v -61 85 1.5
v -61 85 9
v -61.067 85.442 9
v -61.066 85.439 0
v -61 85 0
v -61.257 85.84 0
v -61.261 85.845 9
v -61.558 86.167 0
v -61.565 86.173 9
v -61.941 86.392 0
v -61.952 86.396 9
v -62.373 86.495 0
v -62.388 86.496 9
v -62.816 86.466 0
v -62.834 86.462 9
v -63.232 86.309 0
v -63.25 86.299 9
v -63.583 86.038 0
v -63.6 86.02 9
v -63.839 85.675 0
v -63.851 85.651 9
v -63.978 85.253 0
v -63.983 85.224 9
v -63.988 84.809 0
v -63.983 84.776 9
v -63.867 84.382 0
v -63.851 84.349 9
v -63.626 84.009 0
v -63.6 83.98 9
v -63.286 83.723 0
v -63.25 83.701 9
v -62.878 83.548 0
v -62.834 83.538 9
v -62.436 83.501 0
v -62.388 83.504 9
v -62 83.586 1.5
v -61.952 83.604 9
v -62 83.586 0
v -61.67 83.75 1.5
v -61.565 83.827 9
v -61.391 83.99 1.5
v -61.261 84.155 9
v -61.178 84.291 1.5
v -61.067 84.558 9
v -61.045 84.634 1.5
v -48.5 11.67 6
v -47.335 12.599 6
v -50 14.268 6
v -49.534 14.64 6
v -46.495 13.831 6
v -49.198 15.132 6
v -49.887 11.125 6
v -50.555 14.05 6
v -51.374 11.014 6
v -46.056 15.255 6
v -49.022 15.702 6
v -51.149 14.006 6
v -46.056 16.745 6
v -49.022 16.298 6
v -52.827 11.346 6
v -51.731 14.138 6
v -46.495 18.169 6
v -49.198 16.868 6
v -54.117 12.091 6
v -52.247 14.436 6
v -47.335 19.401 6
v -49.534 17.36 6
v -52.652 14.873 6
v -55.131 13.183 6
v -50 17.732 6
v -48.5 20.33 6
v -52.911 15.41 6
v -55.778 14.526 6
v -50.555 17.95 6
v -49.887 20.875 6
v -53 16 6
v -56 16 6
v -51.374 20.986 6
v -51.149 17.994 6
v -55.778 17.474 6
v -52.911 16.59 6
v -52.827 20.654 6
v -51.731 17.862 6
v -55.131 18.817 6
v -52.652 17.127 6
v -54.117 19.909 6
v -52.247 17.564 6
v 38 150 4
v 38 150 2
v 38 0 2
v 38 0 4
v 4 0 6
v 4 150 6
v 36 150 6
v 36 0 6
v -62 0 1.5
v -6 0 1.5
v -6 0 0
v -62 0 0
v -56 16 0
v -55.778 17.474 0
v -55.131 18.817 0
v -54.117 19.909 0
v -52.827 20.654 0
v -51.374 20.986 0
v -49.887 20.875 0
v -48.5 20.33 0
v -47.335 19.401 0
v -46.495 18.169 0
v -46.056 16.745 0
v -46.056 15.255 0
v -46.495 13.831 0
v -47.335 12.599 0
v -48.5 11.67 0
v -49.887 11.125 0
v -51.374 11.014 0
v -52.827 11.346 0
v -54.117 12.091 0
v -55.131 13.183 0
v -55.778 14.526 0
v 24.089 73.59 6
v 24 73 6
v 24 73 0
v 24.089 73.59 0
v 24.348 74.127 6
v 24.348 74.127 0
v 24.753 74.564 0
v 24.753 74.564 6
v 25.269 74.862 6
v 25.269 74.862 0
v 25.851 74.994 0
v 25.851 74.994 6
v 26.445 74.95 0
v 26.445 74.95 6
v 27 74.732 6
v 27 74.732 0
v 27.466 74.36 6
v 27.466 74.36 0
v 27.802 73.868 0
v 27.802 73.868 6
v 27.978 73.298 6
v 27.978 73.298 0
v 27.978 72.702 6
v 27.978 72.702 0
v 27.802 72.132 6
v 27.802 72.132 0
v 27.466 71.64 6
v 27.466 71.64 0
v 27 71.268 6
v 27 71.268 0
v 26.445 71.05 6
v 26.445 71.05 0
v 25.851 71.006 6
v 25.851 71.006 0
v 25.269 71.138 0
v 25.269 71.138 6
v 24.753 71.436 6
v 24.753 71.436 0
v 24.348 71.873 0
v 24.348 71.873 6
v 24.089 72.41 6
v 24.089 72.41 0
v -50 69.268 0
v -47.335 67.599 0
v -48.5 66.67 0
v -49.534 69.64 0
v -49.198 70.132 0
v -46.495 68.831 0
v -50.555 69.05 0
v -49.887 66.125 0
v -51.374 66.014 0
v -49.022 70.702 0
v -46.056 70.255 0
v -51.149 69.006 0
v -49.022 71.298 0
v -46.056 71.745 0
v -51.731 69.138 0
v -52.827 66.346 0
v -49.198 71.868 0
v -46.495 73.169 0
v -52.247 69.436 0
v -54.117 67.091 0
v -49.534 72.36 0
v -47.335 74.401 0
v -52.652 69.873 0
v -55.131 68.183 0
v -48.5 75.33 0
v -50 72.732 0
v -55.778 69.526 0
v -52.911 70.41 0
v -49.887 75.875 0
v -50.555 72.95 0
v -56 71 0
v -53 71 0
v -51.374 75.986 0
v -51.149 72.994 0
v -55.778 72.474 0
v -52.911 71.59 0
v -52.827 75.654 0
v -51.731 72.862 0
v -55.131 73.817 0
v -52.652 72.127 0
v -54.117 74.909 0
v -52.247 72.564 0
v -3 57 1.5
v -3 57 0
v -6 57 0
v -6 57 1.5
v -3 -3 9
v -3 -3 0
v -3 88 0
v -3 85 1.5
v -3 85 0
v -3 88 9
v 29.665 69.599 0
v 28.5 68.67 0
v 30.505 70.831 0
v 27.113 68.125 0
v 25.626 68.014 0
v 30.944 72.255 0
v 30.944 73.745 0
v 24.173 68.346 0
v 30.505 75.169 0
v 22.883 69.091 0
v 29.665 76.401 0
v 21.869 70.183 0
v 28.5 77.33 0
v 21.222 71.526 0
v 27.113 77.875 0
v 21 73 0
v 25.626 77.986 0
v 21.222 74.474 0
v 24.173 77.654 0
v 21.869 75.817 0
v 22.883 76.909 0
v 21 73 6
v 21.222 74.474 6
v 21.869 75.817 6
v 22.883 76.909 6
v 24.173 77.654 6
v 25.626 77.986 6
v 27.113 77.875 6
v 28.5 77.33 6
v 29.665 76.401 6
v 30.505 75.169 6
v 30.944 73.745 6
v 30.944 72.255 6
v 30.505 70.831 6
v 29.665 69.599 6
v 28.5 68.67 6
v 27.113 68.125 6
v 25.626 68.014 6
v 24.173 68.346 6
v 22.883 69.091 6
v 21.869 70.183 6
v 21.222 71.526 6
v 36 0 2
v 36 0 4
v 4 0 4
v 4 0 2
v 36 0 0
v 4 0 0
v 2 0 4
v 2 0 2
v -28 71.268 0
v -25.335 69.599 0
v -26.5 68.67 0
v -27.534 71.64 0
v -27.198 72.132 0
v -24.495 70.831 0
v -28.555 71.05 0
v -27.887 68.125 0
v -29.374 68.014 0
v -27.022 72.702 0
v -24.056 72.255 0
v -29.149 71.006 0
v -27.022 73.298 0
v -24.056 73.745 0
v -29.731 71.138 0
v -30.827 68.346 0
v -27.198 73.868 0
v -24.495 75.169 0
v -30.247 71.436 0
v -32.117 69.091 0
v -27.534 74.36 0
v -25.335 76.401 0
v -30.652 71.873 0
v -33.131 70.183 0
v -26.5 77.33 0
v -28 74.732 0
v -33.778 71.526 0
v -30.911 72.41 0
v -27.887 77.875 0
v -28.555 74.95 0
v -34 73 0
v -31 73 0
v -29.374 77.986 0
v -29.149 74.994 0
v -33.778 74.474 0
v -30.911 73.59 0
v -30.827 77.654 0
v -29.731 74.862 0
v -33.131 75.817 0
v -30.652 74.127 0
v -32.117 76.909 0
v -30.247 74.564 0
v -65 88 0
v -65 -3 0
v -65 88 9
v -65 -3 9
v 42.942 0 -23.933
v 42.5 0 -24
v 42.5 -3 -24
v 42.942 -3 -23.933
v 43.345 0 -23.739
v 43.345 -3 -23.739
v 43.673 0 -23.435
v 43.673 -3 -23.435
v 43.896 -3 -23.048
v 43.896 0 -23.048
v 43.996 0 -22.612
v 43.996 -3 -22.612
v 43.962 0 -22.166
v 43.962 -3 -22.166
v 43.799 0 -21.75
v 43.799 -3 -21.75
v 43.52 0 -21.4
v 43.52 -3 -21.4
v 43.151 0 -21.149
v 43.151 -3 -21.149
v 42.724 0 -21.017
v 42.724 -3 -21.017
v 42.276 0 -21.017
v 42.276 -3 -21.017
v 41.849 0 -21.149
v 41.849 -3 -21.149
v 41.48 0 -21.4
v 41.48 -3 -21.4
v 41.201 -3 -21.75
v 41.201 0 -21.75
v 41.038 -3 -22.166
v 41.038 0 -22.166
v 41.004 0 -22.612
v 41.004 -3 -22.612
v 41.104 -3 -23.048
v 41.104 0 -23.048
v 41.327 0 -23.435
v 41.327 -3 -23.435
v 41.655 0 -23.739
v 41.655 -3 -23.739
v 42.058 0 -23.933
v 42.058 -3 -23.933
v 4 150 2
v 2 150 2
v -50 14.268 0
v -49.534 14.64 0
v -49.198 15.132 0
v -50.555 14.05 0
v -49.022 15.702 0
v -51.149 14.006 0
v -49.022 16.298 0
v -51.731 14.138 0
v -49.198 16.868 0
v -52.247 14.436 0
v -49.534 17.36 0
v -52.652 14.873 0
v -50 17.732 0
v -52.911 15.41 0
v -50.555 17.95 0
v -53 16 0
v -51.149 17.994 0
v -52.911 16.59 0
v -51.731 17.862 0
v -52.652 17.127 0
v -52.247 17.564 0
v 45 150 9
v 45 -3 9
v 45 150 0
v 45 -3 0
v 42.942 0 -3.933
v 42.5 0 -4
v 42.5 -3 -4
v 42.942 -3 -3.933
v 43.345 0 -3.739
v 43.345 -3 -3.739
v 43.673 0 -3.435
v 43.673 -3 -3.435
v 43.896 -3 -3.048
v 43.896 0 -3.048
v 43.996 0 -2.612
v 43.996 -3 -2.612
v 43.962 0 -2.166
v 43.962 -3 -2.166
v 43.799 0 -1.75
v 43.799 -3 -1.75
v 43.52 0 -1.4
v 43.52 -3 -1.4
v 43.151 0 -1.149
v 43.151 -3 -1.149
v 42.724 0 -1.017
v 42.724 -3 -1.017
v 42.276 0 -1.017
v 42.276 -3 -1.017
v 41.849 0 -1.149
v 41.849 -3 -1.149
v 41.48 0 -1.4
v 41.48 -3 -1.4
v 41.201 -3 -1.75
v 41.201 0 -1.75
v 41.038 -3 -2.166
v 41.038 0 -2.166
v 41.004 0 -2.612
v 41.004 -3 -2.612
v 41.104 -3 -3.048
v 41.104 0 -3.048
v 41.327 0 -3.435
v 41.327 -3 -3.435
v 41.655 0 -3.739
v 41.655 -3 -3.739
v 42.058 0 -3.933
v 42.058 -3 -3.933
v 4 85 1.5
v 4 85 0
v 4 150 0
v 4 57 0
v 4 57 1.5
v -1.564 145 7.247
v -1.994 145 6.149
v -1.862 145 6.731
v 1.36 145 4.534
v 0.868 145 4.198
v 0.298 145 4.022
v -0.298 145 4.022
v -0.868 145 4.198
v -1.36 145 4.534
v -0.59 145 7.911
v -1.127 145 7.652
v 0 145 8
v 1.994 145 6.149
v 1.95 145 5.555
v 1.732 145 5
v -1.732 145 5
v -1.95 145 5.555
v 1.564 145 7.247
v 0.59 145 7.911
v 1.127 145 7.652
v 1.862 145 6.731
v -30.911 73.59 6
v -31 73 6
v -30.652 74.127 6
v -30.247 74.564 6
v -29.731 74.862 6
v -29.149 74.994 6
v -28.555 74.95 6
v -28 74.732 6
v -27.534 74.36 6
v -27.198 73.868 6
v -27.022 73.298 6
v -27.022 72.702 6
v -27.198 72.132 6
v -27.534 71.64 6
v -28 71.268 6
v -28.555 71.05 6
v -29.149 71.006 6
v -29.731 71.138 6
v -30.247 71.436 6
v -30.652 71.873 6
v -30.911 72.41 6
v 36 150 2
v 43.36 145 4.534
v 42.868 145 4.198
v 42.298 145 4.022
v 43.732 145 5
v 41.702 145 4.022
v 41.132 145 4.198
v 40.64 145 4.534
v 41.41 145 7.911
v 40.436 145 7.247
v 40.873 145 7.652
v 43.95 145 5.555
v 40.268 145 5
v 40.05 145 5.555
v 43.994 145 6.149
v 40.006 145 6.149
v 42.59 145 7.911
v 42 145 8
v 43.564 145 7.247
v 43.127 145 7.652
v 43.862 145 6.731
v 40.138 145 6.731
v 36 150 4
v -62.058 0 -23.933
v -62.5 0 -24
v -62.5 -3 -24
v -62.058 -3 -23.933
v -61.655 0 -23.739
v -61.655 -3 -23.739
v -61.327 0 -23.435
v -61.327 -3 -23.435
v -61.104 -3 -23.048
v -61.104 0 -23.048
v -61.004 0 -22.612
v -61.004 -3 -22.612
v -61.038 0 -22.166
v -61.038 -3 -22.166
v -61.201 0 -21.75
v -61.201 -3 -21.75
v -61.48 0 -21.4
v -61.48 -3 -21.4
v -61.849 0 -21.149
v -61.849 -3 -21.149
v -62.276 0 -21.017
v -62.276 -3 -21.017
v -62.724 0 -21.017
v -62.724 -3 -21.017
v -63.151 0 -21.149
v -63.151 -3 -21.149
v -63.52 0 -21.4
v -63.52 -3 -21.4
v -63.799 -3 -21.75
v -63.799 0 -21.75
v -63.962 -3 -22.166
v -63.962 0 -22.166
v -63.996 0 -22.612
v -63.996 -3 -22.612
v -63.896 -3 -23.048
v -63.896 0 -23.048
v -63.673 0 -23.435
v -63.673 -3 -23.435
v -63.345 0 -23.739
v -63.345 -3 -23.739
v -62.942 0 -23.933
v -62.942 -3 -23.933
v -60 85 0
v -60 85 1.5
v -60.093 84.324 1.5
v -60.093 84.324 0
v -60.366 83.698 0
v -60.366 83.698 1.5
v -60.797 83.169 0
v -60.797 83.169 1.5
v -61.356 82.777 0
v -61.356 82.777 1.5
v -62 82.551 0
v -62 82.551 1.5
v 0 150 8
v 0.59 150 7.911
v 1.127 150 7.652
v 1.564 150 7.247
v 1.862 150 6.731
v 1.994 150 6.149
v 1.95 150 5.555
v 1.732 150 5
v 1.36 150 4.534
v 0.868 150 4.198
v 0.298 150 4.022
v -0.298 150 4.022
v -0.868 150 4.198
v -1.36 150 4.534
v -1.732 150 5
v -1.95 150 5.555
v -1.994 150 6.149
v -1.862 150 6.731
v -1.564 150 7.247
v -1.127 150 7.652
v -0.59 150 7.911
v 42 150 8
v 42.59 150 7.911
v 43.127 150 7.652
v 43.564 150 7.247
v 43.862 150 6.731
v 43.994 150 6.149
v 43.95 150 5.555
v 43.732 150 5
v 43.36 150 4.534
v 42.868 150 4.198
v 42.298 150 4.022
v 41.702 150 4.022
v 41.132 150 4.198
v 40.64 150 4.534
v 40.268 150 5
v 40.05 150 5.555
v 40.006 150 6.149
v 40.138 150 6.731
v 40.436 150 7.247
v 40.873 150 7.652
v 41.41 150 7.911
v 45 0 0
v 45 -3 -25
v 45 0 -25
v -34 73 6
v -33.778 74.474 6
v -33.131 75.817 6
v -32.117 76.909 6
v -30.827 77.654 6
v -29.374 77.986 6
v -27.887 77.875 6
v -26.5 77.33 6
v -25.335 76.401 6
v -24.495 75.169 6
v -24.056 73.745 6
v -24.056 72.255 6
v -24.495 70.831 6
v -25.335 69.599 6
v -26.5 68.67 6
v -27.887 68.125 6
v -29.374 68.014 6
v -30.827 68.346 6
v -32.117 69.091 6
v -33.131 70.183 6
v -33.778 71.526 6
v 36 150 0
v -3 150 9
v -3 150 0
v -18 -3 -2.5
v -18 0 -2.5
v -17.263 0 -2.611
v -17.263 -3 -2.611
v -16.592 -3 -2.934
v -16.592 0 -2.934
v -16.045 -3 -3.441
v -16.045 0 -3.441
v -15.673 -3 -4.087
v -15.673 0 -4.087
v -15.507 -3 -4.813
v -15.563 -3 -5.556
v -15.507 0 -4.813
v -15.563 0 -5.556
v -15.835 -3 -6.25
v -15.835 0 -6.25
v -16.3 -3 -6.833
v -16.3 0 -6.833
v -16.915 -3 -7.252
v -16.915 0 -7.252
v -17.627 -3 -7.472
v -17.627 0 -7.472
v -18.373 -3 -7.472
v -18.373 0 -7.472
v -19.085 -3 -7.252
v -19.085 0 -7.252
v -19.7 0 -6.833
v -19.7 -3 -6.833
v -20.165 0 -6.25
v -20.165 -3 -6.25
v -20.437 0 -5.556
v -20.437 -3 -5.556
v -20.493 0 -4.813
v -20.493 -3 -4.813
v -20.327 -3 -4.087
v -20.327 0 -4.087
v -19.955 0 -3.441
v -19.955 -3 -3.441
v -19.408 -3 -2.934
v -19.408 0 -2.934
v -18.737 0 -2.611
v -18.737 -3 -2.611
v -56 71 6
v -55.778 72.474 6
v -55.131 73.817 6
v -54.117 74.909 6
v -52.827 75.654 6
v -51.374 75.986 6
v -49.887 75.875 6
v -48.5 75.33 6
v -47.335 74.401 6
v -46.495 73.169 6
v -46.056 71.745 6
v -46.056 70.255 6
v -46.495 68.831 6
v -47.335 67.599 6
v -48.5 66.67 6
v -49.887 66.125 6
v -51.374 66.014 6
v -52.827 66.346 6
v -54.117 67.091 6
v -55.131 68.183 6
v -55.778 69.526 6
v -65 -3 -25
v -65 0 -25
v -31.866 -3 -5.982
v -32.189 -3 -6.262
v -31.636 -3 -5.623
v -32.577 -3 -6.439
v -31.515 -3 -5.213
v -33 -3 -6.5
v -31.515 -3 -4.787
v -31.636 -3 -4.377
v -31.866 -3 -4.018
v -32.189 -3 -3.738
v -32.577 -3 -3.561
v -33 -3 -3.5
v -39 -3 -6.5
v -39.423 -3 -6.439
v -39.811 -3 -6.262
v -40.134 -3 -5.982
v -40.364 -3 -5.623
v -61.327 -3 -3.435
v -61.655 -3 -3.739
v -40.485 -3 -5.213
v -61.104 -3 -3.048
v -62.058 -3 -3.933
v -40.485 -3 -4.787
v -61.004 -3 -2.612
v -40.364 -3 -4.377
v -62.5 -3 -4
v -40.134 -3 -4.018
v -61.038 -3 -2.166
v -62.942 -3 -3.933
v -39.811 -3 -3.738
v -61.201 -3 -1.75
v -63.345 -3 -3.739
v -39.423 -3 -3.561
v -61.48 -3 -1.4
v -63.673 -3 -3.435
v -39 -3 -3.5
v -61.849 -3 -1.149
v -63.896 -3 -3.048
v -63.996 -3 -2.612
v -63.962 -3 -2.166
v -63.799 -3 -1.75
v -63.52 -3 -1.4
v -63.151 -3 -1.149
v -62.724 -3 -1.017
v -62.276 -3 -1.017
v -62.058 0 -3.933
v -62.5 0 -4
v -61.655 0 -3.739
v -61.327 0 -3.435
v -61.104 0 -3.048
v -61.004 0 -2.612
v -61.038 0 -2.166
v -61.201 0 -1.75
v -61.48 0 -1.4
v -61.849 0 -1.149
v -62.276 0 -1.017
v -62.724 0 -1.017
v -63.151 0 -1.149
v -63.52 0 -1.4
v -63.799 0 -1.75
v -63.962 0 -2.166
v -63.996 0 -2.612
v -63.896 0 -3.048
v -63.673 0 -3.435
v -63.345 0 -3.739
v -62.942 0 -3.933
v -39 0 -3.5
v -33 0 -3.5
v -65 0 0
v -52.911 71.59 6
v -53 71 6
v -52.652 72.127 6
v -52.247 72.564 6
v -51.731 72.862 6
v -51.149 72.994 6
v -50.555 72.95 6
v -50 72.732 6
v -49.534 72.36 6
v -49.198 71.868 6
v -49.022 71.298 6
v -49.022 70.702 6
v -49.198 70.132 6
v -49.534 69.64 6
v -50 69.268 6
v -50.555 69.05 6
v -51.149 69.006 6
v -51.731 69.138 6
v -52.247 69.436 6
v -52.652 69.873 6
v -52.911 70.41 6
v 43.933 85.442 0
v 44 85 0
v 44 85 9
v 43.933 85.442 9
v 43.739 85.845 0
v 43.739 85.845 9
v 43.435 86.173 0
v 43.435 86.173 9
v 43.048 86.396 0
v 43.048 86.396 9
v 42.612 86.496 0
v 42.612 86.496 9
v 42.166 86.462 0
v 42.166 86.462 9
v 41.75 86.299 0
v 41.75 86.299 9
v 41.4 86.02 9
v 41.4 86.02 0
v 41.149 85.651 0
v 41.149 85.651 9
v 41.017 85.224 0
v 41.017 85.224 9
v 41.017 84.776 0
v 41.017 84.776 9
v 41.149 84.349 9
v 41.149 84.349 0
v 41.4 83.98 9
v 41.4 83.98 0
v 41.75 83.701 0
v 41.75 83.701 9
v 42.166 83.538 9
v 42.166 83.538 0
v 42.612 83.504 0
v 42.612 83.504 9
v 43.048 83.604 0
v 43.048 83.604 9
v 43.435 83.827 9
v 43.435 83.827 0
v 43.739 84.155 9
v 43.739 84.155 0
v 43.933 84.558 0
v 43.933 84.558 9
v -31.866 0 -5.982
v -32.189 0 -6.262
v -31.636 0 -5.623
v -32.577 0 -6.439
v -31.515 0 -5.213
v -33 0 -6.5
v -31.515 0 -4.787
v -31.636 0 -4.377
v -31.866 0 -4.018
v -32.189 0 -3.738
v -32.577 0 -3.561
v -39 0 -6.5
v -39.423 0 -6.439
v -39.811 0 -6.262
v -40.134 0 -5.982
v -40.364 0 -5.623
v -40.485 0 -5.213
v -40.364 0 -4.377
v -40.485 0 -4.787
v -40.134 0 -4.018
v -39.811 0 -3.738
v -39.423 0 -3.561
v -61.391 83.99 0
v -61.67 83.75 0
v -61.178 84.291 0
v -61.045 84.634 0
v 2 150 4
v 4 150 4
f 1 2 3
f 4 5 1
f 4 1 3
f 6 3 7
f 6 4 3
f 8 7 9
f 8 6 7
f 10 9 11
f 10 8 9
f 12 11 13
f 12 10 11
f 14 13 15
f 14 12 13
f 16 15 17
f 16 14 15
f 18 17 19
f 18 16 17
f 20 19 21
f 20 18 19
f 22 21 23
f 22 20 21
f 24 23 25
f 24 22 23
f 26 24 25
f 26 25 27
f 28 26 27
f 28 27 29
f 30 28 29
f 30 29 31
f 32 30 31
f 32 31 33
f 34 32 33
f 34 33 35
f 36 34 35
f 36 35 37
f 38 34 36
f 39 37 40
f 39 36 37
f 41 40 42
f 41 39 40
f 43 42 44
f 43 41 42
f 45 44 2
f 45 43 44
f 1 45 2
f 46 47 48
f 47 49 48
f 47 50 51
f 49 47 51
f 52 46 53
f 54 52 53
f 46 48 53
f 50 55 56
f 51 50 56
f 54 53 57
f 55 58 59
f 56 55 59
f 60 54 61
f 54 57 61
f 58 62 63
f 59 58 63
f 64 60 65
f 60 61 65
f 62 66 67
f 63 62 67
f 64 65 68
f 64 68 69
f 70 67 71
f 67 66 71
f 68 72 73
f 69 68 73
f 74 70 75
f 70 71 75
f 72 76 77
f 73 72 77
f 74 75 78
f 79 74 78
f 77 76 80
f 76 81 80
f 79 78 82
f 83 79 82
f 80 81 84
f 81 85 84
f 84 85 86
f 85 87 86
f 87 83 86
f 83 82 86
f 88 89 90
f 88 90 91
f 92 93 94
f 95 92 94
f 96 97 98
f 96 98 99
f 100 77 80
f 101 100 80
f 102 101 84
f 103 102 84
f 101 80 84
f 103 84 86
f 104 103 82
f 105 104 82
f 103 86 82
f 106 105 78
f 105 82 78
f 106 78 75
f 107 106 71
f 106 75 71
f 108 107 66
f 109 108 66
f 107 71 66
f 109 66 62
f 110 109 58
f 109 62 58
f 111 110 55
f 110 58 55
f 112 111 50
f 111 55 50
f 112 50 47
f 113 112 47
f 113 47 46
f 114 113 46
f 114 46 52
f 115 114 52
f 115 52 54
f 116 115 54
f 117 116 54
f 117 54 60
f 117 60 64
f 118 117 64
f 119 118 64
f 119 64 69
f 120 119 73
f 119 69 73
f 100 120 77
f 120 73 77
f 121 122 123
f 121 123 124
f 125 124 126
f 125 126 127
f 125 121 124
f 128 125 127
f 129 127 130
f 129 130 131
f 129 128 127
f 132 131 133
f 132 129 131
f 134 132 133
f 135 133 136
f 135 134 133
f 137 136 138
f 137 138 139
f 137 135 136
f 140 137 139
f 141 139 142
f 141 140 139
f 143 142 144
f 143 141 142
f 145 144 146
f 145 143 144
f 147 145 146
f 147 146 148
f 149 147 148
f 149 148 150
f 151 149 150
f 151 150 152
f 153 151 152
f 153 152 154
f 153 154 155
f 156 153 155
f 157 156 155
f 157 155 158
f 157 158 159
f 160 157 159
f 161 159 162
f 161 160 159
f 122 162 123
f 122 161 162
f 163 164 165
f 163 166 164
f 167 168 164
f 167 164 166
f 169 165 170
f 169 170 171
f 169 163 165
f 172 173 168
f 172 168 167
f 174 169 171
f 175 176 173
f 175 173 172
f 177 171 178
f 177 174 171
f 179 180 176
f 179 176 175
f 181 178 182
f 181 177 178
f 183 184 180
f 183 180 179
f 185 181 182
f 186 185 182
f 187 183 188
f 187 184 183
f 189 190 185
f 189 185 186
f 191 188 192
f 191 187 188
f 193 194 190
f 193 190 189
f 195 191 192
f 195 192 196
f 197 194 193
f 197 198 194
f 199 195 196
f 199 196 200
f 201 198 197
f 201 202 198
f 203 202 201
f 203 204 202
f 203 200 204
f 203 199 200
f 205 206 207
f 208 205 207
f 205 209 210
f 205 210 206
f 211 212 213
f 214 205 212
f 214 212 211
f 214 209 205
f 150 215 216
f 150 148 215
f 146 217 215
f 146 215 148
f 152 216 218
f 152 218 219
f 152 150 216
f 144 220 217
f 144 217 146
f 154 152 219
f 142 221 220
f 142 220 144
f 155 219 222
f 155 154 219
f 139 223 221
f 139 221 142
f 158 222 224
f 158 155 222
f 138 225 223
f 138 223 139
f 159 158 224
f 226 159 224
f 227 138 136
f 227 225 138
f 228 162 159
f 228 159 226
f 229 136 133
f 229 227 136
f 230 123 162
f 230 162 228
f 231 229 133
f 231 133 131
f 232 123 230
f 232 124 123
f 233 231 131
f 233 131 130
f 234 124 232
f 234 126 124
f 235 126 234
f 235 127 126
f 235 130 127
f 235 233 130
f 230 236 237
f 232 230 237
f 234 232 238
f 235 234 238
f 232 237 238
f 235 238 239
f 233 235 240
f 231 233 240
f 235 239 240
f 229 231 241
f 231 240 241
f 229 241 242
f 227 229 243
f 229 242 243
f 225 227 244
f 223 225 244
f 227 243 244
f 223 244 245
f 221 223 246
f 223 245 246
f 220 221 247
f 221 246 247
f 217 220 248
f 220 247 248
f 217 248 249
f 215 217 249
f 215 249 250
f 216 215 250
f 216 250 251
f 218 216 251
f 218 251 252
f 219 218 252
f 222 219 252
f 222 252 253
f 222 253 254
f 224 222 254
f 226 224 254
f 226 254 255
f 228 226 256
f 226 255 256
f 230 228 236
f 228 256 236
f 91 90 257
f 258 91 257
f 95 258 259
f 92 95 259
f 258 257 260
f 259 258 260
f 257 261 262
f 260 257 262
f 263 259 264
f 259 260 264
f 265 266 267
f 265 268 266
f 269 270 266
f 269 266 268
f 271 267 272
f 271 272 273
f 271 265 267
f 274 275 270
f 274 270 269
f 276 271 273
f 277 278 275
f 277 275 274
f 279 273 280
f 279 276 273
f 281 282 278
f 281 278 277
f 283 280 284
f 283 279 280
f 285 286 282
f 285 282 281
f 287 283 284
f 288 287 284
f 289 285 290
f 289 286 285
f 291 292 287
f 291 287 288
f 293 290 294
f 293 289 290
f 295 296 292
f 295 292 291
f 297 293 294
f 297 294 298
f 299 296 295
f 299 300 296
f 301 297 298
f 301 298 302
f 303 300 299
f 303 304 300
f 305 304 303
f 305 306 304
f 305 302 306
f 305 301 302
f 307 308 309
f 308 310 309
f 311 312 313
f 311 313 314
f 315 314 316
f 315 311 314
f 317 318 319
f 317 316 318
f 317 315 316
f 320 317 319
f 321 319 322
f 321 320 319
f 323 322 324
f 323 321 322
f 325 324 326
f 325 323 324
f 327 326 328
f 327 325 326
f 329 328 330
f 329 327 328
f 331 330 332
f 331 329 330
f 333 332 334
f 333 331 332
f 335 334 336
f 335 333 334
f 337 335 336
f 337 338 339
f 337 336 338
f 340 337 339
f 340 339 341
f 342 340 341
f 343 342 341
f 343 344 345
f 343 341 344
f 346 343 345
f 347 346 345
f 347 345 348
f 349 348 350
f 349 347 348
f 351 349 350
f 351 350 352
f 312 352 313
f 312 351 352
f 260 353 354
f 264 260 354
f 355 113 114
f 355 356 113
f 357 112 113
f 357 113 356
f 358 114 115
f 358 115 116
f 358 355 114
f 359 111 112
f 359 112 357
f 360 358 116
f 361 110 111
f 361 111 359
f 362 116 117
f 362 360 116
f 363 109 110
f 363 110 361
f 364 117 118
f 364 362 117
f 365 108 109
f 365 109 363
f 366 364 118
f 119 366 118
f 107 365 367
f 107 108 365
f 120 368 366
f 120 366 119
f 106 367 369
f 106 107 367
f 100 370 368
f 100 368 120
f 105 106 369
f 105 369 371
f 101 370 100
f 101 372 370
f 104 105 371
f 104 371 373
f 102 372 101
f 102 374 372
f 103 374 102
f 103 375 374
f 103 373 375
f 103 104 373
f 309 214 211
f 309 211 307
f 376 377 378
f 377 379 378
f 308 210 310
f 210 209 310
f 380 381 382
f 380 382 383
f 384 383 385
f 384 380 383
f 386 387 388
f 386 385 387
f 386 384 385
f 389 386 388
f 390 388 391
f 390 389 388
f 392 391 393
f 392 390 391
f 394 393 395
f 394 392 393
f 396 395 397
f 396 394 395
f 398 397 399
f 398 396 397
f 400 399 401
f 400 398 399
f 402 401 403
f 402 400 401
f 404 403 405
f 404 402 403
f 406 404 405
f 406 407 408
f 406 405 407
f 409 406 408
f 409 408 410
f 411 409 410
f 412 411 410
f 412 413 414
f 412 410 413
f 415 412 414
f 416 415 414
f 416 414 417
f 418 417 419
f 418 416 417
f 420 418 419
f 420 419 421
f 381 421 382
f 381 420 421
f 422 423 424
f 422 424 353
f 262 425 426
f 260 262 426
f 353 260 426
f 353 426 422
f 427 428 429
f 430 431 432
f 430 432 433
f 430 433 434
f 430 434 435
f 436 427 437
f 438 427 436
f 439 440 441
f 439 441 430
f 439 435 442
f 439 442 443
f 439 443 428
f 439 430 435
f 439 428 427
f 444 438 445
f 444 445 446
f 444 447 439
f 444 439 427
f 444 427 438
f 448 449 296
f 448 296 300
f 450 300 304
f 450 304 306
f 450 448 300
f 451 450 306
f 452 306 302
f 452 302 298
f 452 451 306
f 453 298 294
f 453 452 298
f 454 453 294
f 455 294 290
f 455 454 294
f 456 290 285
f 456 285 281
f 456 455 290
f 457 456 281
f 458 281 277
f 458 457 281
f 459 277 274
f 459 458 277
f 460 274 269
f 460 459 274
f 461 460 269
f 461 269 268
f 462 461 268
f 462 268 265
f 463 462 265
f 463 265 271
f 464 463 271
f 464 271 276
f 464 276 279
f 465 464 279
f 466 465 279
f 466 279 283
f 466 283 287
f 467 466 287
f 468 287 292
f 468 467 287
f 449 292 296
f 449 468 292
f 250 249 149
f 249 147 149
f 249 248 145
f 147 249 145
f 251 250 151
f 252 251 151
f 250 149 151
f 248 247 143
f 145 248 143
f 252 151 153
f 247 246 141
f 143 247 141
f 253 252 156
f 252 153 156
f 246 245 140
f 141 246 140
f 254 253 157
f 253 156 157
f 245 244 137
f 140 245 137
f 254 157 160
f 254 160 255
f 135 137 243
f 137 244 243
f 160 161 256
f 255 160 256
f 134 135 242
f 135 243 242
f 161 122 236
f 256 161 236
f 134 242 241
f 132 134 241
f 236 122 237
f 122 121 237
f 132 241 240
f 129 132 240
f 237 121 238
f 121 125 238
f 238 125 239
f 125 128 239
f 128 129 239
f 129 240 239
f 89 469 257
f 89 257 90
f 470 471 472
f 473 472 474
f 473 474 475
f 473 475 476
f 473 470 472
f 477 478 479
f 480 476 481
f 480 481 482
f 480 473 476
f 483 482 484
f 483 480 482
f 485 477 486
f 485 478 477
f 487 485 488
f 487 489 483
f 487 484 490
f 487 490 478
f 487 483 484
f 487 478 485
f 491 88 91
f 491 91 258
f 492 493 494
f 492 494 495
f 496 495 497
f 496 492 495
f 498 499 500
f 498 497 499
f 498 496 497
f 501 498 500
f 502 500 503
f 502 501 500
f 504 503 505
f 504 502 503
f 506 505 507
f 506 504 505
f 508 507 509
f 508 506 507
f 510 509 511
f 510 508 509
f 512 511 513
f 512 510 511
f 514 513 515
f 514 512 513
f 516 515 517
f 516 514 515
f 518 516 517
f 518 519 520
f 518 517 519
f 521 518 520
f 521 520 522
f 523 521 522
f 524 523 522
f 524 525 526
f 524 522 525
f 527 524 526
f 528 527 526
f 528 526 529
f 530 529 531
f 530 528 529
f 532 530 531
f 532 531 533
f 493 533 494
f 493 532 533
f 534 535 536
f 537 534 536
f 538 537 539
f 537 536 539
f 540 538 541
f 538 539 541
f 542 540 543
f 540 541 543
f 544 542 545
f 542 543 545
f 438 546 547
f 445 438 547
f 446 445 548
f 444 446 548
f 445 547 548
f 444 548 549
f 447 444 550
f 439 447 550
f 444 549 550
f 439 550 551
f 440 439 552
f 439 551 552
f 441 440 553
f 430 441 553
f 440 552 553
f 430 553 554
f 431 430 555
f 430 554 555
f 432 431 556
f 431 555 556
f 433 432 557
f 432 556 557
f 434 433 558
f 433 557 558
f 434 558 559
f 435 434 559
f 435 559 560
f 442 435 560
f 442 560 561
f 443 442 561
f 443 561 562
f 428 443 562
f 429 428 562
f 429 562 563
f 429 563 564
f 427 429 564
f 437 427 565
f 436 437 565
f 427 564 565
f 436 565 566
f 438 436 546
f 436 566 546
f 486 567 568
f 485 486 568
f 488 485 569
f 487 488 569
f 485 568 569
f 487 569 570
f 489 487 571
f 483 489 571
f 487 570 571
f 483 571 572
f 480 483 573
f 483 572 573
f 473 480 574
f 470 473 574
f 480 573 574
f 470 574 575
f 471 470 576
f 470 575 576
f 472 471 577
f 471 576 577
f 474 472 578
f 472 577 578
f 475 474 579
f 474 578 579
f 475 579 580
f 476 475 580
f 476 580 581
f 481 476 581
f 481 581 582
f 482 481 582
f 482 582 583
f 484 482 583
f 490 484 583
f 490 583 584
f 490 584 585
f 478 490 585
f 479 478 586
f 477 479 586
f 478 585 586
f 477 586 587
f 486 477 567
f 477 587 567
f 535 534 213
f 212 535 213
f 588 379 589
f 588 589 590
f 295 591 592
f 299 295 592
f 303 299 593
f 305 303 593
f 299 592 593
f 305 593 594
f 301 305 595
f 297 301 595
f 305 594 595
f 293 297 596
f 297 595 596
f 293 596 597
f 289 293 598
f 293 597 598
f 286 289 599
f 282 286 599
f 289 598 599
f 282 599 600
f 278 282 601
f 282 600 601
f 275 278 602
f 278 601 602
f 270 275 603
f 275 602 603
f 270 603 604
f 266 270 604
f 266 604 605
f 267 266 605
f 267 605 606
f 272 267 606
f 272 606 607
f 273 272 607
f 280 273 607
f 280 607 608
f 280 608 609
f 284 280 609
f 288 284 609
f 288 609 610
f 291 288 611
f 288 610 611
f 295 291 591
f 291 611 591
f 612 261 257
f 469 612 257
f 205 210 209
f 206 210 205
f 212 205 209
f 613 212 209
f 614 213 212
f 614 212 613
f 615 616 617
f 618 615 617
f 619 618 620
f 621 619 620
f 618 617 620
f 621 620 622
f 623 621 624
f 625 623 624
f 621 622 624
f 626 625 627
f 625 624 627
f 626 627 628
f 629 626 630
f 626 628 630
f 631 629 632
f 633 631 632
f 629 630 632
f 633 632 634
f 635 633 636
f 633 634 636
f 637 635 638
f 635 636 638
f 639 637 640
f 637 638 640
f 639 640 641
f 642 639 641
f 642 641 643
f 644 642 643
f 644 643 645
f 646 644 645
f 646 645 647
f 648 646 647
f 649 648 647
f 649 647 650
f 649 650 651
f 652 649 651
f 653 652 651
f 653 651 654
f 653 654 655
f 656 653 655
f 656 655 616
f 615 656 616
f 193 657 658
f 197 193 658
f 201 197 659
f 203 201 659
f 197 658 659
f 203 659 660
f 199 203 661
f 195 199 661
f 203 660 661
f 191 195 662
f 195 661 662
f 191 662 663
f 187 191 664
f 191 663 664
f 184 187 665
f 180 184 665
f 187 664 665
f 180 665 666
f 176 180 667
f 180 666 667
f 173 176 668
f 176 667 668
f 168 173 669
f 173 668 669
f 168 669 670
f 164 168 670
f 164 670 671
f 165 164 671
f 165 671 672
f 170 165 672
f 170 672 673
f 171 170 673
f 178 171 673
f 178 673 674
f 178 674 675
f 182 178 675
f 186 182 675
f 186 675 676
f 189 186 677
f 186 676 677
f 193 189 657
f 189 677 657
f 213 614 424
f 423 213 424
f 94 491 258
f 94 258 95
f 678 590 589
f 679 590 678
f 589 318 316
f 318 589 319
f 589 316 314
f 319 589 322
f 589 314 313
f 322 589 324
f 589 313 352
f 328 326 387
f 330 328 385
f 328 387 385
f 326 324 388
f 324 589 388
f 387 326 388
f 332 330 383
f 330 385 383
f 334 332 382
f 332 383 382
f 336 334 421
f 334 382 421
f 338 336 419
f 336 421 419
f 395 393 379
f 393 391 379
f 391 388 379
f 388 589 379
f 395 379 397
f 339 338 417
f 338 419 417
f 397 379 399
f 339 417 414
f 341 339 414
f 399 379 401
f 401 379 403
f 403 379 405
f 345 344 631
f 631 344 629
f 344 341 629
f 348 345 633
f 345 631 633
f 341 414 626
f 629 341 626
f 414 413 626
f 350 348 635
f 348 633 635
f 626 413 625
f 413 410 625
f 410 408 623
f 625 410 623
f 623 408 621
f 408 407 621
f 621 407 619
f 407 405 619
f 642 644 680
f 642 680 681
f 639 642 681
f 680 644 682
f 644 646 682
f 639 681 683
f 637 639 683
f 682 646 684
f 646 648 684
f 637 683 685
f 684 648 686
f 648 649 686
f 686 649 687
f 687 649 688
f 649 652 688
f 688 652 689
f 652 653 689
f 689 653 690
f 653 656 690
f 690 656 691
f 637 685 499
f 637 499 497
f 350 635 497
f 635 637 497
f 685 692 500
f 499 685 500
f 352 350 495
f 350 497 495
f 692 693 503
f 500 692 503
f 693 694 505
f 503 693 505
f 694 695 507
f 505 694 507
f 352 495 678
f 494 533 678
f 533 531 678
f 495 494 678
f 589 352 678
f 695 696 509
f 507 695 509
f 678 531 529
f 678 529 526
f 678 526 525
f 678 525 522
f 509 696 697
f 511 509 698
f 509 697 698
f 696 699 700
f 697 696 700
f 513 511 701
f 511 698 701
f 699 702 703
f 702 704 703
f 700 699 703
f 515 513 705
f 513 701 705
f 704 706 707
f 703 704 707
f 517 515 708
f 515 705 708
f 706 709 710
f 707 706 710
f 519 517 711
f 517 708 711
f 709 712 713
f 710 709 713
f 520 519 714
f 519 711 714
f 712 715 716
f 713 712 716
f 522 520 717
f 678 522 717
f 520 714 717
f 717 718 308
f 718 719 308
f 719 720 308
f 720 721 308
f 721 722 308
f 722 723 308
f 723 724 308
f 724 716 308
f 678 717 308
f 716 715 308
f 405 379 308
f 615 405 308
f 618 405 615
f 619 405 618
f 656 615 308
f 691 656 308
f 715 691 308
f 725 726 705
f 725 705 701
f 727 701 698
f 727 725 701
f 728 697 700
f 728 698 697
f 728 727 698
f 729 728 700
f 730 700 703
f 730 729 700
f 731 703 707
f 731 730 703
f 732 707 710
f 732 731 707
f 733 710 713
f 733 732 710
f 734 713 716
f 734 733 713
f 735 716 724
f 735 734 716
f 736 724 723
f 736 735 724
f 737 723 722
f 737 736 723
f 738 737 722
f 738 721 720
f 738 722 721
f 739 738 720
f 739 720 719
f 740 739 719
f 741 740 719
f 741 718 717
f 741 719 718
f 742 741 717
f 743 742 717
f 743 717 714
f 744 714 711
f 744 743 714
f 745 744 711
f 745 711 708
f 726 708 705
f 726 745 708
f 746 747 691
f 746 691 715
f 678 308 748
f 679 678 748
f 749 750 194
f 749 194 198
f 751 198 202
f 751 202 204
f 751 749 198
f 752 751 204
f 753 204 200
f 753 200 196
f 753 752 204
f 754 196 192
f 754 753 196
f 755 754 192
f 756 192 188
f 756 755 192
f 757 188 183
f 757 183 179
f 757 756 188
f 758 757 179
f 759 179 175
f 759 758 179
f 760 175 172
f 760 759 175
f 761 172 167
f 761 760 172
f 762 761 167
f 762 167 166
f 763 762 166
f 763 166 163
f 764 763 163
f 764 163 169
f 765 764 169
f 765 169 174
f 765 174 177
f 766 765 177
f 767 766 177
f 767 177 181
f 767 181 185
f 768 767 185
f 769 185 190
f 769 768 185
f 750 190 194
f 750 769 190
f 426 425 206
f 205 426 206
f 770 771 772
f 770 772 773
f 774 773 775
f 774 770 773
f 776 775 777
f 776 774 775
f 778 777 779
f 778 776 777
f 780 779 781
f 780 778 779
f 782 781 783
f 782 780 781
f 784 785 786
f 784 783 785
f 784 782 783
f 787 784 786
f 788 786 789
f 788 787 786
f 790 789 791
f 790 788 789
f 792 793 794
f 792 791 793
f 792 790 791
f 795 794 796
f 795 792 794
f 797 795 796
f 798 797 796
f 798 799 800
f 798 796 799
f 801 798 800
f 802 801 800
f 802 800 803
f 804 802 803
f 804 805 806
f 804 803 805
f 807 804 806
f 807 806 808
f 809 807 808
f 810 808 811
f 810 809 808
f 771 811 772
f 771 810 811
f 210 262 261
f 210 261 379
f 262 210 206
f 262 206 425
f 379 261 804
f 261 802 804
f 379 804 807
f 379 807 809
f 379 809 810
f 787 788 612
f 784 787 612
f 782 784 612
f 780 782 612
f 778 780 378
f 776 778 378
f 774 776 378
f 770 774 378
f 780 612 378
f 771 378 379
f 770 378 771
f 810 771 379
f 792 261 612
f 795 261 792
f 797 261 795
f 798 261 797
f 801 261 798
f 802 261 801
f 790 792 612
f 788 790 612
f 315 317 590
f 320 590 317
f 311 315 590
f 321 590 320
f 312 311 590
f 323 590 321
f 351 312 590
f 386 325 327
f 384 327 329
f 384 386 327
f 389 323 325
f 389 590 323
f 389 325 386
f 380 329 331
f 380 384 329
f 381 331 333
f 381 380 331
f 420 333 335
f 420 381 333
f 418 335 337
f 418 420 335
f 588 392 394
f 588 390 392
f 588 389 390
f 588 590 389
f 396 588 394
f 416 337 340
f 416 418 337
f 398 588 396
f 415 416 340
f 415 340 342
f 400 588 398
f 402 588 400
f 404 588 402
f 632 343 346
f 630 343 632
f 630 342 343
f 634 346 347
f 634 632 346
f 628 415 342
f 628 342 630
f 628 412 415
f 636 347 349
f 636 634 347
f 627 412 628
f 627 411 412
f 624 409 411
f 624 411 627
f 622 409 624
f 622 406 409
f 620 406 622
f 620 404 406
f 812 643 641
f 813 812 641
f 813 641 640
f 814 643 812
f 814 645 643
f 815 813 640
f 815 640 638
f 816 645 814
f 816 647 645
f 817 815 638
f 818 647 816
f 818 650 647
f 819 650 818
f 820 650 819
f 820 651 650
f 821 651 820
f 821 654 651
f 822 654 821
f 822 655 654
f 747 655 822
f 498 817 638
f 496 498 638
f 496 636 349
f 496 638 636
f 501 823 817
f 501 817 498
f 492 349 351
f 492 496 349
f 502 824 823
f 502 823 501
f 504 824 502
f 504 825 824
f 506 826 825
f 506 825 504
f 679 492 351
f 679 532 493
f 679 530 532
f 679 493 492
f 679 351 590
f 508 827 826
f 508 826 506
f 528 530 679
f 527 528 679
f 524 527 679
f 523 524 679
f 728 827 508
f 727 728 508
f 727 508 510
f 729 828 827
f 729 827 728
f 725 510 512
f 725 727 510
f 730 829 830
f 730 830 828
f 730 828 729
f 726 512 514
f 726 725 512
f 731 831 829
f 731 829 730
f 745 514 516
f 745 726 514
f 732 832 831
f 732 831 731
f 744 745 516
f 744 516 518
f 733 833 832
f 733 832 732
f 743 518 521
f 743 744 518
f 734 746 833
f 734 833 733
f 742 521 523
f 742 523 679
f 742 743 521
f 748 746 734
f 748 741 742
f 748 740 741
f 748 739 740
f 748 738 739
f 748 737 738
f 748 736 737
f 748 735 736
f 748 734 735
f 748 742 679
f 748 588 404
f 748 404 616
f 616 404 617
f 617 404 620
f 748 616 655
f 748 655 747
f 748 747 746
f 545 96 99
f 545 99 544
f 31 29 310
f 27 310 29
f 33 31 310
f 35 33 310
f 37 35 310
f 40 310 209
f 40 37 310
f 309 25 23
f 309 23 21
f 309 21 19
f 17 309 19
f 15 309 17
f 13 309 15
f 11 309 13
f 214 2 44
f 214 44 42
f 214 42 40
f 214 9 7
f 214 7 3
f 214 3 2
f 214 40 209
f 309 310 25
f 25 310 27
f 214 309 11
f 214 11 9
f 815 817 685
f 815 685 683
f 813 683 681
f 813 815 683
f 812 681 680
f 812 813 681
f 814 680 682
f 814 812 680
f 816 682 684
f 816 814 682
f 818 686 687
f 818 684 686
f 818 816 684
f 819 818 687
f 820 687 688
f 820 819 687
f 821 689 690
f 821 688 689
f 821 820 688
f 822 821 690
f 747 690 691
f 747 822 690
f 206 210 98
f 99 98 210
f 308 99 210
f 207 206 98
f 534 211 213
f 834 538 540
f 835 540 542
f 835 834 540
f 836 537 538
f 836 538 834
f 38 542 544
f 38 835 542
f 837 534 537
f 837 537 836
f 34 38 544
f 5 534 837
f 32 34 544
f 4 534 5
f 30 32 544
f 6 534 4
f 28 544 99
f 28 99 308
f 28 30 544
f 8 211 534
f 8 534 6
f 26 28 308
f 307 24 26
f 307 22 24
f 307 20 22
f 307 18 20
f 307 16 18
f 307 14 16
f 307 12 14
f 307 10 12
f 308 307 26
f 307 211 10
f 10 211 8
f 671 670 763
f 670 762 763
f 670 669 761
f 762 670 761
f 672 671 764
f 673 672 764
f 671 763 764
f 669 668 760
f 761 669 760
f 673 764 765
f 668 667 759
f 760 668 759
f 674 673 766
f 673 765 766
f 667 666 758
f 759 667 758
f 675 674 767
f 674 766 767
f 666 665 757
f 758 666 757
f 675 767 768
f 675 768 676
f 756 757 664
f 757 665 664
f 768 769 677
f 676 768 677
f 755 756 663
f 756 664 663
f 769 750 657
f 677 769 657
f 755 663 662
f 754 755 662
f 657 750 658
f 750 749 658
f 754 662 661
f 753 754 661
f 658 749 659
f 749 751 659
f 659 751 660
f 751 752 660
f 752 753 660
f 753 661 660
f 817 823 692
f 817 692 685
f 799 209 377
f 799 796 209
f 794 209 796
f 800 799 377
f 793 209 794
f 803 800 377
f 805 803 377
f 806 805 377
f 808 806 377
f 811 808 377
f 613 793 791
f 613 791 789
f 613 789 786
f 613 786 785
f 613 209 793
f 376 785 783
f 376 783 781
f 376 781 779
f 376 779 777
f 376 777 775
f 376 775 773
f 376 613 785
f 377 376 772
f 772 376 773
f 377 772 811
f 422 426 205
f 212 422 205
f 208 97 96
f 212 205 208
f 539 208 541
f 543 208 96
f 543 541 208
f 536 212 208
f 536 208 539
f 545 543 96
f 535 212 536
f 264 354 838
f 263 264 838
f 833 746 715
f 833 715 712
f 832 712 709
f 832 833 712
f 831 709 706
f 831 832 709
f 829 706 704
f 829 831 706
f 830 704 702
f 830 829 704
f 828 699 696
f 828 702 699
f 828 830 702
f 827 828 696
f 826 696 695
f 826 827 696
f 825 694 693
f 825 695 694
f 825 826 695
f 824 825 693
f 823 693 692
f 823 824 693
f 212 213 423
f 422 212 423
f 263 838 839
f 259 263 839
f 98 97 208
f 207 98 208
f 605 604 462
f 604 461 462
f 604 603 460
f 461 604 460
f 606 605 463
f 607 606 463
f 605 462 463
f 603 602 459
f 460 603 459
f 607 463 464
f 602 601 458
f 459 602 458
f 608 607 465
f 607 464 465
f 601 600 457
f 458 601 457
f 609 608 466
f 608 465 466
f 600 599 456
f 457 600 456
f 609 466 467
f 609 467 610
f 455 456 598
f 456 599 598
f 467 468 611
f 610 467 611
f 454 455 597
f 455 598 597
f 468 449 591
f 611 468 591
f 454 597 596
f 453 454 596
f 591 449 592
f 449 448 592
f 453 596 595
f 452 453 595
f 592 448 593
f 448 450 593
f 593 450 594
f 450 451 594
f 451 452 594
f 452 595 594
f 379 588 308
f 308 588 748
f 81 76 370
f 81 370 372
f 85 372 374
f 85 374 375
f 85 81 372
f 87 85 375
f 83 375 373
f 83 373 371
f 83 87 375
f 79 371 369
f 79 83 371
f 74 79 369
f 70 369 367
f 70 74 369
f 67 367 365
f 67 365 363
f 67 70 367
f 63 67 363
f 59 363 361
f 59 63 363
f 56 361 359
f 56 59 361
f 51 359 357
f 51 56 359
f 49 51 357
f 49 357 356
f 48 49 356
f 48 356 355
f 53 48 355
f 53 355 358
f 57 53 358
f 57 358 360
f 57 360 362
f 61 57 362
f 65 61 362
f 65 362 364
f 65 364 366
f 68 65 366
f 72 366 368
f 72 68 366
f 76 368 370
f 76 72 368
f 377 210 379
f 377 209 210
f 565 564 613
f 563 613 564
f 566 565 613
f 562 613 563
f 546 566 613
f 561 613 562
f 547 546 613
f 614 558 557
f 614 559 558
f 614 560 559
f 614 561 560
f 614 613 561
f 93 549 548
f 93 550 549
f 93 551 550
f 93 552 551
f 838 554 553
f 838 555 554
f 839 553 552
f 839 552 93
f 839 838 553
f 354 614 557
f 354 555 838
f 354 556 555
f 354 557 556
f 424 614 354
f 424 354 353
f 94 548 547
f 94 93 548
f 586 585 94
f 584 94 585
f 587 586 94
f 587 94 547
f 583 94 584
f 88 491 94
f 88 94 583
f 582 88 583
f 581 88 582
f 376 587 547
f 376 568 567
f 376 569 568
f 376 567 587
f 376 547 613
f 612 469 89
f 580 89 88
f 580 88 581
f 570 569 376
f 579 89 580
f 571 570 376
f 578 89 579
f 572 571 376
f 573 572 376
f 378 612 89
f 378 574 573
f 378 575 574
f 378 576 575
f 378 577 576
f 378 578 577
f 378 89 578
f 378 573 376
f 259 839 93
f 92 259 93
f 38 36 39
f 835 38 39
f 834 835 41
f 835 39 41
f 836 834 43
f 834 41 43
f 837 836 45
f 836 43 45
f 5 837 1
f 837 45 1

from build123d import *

# Parameters (mm, degrees)
P_IDAT_VYSUNUT_M1_DEPTH           = 6
SKICA2_W                          = 48
SKICA2_H                          = 153
P_IDAT_VYSUNUT_M2_DEPTH           = 3
SKICA5_W                          = 62
SKICA5_H                          = 91
P_IDAT_VYSUNUT_M4_DEPTH           = 7.5
SKICA7_W                          = 62
SKICA7_H                          = 91
SKICA7_W_2                        = 56
SKICA7_H_2                        = 85
P_IDAT_VYSUNUT_M5_DEPTH           = 1.5
P_IDAT_VYSUNUT_M6_DEPTH           = 153
SKICA9_W                          = 7
SKICA9_H                          = 28
SKICA9_W_2                        = 3
ODEBRAT_VYSUNUT_M2_DEPTH          = 1.5
SKICA10_W                         = 110
SKICA10_H                         = 3
P_IDAT_VYSUNUT_M7_DEPTH           = 25
SKICA11_R                         = 2.5
ODEBRAT_VYSUNUT_M3_DEPTH          = 166.378354085
VYSUNOUT_START                    = -4.5
VYSUNOUT_TENKOST_NN_1_OUTLINE_R   = 5
VYSUNOUT_TENKOST_NN_1_OUTLINE_R_2 = 2
VYSUNOUT_TENKOST_NN_1_DEPTH       = 6
SKICA13_R                         = 2
ODEBRAT_VYSUNUT_M4_DEPTH          = 5
ODEBRAT_VYSUNUT_M6_DEPTH          = 169.104134393
ODEBRAT_VYSUNUT_M6_DEPTH_BACK     = 169.104134393
SKICA14_R                         = 1.5
ODEBRAT_VYSUNUT_M7_DEPTH          = 167.976046186
ODEBRAT_VYSUNUT_M7_DEPTH_BACK     = 167.976046186
SKICA15_R                         = 1.5
P_IDAT_VYSUNUT_M8_DEPTH           = 1.5


# Read off the part's stored shape, not the designer's step: Vysunout tenkostěnný1
with BuildPart() as part:
    # Skica1 → Přidat vysunutím1 (new body)
    with BuildSketch(Plane.XY):
        Polygon((40, -3), (45, -3), (45, 150), (40, 150), (40, 0), (0, 0), (0, 150), (-3, 150), (-3, -3), (0, -3), align=None)
    extrude(amount=P_IDAT_VYSUNUT_M1_DEPTH)

    # Skica2 → Přidat vysunutím2 (add)
    with BuildSketch(Plane.XY.offset(6)):
        with Locations((21, 73.5)):
            Rectangle(SKICA2_W, SKICA2_H)
    extrude(amount=P_IDAT_VYSUNUT_M2_DEPTH)

    # Skica3 → Přidat vysunutím6 (add, through all)
    with BuildSketch(Plane.XZ.offset(3)):
        Polygon((0, 0), (4, 0), (4, 2), (2, 2), (2, 4), (4, 4), (4, 6), (0, 6), align=None)
        Polygon((40, 0), (36, 0), (36, 2), (38, 2), (38, 4), (36, 4), (36, 6), (40, 6), align=None)
    extrude(amount=-P_IDAT_VYSUNUT_M6_DEPTH)


with BuildPart() as body_2:
    # Skica5 → Přidat vysunutím4 (new body)
    with BuildSketch(Plane.XY.offset(9)):
        with Locations((-34, 42.5)):
            Rectangle(SKICA5_W, SKICA5_H)
    extrude(amount=-P_IDAT_VYSUNUT_M4_DEPTH)

    # Skica7 → Přidat vysunutím5 (add, through all)
    with BuildSketch(Plane(origin=(0, 0, 1.5), x_dir=(-1, 0, 0), z_dir=(0, 0, -1))):
        with Locations((34, 42.5)):
            Rectangle(SKICA7_W, SKICA7_H)
        with Locations((34, 42.5)):
            Rectangle(SKICA7_W_2, SKICA7_H_2, mode=Mode.SUBTRACT)
    extrude(amount=P_IDAT_VYSUNUT_M5_DEPTH)


with BuildPart() as odebrat_vysunut_m2_tool:
    # Skica9 → Odebrat vysunutím2 (new body)
    with BuildSketch(Plane(origin=(0, 0, 0), x_dir=(-1, 0, 0), z_dir=(0, 0, -1))):
        with Locations((-0.5, 71)):
            Rectangle(SKICA9_W, SKICA9_H)
        with Locations((4.5, 71)):
            Rectangle(SKICA9_W_2, SKICA9_H)
    extrude(amount=-ODEBRAT_VYSUNUT_M2_DEPTH)


with BuildPart() as part_1:
    add(part.part)

    # Odebrat vysunutím2: cut by odebrat_vysunut_m2_tool
    add(odebrat_vysunut_m2_tool.part, mode=Mode.SUBTRACT)

    # Skica13 → Odebrat vysunutím4 (cut)
    with BuildSketch(Plane(origin=(0, 150, 0), x_dir=(1, 0, 0), z_dir=(0, 1, 0))):
        with Locations(Location((42, -6, 0), (0, 0, 270))):
            Circle(SKICA13_R)
        with Locations(Location((0, -6, 0), (0, 0, 270))):
            Circle(SKICA13_R)
    extrude(amount=-ODEBRAT_VYSUNUT_M4_DEPTH, mode=Mode.SUBTRACT)


with BuildPart() as body_2_1:
    add(body_2.part)

    # Odebrat vysunutím2: cut by odebrat_vysunut_m2_tool
    add(odebrat_vysunut_m2_tool.part, mode=Mode.SUBTRACT)


with BuildPart() as body_3:
    # Skica10 → Přidat vysunutím7 (new body)
    with BuildSketch(Plane(origin=(0, 0, 0), x_dir=(-1, 0, 0), z_dir=(0, 0, -1))):
        with Locations((10, -1.5)):
            Rectangle(SKICA10_W, SKICA10_H)
    extrude(amount=P_IDAT_VYSUNUT_M7_DEPTH)

    # Skica11 → Odebrat vysunutím3 (cut, through all)
    with BuildSketch(Plane(origin=(0, 0, 0), x_dir=(1, 0, 0), z_dir=(0, 1, 0))):
        with Locations(Location((-18, 5, 0), (0, 0, 270))):
            Circle(SKICA11_R)
        with BuildLine():
            Line((-33, 3.5), (-39, 3.5))
            ThreePointArc((-39, 3.5), (-40.5, 5), (-39, 6.5))
            Line((-39, 6.5), (-33, 6.5))
            ThreePointArc((-33, 6.5), (-31.5, 5), (-33, 3.5))
        make_face()
    extrude(amount=-ODEBRAT_VYSUNUT_M3_DEPTH, mode=Mode.SUBTRACT)

    # Skica14 → Odebrat vysunutím6 (cut, two sides: drawn at the far end of the back side and taken through both)
    with BuildSketch(Plane.XZ.offset(3).offset(-ODEBRAT_VYSUNUT_M6_DEPTH_BACK)):
        with Locations(Location((-62.5, -2.5, 0), (0, 0, 270))):
            Circle(SKICA14_R)
        with Locations(Location((-62.5, -22.5, 0), (0, 0, 270))):
            Circle(SKICA14_R)
        with Locations(Location((42.5, -2.5, 0), (0, 0, 270))):
            Circle(SKICA14_R)
        with Locations(Location((42.5, -22.5, 0), (0, 0, 270))):
            Circle(SKICA14_R)
    extrude(amount=ODEBRAT_VYSUNUT_M6_DEPTH + ODEBRAT_VYSUNUT_M6_DEPTH_BACK, mode=Mode.SUBTRACT)


with BuildPart() as body_4:
    # Vysunout tenkostěnný1 outline → Vysunout tenkostěnný1 (new body)
    # profile 1 of 4: a face of its own
    with BuildSketch(Plane(origin=(0, 0, 1.5), x_dir=(-1, 0, 0), z_dir=(0, 0, -1)).offset(VYSUNOUT_START)):
        with Locations((51, 16)):
            Circle(VYSUNOUT_TENKOST_NN_1_OUTLINE_R)
        with Locations((51, 16)):
            Circle(VYSUNOUT_TENKOST_NN_1_OUTLINE_R_2, mode=Mode.SUBTRACT)
    # profile 2 of 4: a face of its own
    with BuildSketch(Plane(origin=(0, 0, 1.5), x_dir=(-1, 0, 0), z_dir=(0, 0, -1)).offset(VYSUNOUT_START)):
        with Locations((-26, 73)):
            Circle(VYSUNOUT_TENKOST_NN_1_OUTLINE_R)
        with Locations((-26, 73)):
            Circle(VYSUNOUT_TENKOST_NN_1_OUTLINE_R_2, mode=Mode.SUBTRACT)
    # profile 3 of 4: a face of its own
    with BuildSketch(Plane(origin=(0, 0, 1.5), x_dir=(-1, 0, 0), z_dir=(0, 0, -1)).offset(VYSUNOUT_START)):
        with Locations((29, 73)):
            Circle(VYSUNOUT_TENKOST_NN_1_OUTLINE_R)
        with Locations((29, 73)):
            Circle(VYSUNOUT_TENKOST_NN_1_OUTLINE_R_2, mode=Mode.SUBTRACT)
    # profile 4 of 4: a face of its own
    with BuildSketch(Plane(origin=(0, 0, 1.5), x_dir=(-1, 0, 0), z_dir=(0, 0, -1)).offset(VYSUNOUT_START)):
        with Locations((51, 71)):
            Circle(VYSUNOUT_TENKOST_NN_1_OUTLINE_R)
        with Locations((51, 71)):
            Circle(VYSUNOUT_TENKOST_NN_1_OUTLINE_R_2, mode=Mode.SUBTRACT)
    extrude(amount=VYSUNOUT_TENKOST_NN_1_DEPTH)


with BuildPart() as odebrat_vysunut_m7_tool:
    # Skica15 → Odebrat vysunutím7 (new, two sides: drawn at the far end of the back side and taken through both)
    with BuildSketch(Plane.XY.offset(9).offset(-ODEBRAT_VYSUNUT_M7_DEPTH_BACK)):
        with Locations((-62.5, 85)):
            Circle(SKICA15_R)
        with Locations((42.5, 85)):
            Circle(SKICA15_R)
    extrude(amount=ODEBRAT_VYSUNUT_M7_DEPTH + ODEBRAT_VYSUNUT_M7_DEPTH_BACK)


with BuildPart() as part_2:
    add(part_1.part)

    # Odebrat vysunutím7: cut by odebrat_vysunut_m7_tool
    add(odebrat_vysunut_m7_tool.part, mode=Mode.SUBTRACT)


with BuildPart() as body_2_2:
    add(body_2_1.part)

    # Odebrat vysunutím7: cut by odebrat_vysunut_m7_tool
    add(odebrat_vysunut_m7_tool.part, mode=Mode.SUBTRACT)

    # Skica16 → Přidat vysunutím8 (add)
    with BuildSketch(Plane(origin=(0, 0, 1.5), x_dir=(-1, 0, 0), z_dir=(0, 0, -1))):
        with BuildLine():
            Line((62, 82.550510257), (62, 83.585786438))
            ThreePointArc((62, 83.585786438), (61.275255129, 84.133974596), (61, 85))
            Line((61, 85), (60, 85))
            ThreePointArc((60, 85), (60.563508327, 83.41886117), (62, 82.550510257))
        make_face()
    extrude(amount=P_IDAT_VYSUNUT_M8_DEPTH)


solid = Compound([body_3.part, body_4.part, part_2.part, body_2_2.part])
